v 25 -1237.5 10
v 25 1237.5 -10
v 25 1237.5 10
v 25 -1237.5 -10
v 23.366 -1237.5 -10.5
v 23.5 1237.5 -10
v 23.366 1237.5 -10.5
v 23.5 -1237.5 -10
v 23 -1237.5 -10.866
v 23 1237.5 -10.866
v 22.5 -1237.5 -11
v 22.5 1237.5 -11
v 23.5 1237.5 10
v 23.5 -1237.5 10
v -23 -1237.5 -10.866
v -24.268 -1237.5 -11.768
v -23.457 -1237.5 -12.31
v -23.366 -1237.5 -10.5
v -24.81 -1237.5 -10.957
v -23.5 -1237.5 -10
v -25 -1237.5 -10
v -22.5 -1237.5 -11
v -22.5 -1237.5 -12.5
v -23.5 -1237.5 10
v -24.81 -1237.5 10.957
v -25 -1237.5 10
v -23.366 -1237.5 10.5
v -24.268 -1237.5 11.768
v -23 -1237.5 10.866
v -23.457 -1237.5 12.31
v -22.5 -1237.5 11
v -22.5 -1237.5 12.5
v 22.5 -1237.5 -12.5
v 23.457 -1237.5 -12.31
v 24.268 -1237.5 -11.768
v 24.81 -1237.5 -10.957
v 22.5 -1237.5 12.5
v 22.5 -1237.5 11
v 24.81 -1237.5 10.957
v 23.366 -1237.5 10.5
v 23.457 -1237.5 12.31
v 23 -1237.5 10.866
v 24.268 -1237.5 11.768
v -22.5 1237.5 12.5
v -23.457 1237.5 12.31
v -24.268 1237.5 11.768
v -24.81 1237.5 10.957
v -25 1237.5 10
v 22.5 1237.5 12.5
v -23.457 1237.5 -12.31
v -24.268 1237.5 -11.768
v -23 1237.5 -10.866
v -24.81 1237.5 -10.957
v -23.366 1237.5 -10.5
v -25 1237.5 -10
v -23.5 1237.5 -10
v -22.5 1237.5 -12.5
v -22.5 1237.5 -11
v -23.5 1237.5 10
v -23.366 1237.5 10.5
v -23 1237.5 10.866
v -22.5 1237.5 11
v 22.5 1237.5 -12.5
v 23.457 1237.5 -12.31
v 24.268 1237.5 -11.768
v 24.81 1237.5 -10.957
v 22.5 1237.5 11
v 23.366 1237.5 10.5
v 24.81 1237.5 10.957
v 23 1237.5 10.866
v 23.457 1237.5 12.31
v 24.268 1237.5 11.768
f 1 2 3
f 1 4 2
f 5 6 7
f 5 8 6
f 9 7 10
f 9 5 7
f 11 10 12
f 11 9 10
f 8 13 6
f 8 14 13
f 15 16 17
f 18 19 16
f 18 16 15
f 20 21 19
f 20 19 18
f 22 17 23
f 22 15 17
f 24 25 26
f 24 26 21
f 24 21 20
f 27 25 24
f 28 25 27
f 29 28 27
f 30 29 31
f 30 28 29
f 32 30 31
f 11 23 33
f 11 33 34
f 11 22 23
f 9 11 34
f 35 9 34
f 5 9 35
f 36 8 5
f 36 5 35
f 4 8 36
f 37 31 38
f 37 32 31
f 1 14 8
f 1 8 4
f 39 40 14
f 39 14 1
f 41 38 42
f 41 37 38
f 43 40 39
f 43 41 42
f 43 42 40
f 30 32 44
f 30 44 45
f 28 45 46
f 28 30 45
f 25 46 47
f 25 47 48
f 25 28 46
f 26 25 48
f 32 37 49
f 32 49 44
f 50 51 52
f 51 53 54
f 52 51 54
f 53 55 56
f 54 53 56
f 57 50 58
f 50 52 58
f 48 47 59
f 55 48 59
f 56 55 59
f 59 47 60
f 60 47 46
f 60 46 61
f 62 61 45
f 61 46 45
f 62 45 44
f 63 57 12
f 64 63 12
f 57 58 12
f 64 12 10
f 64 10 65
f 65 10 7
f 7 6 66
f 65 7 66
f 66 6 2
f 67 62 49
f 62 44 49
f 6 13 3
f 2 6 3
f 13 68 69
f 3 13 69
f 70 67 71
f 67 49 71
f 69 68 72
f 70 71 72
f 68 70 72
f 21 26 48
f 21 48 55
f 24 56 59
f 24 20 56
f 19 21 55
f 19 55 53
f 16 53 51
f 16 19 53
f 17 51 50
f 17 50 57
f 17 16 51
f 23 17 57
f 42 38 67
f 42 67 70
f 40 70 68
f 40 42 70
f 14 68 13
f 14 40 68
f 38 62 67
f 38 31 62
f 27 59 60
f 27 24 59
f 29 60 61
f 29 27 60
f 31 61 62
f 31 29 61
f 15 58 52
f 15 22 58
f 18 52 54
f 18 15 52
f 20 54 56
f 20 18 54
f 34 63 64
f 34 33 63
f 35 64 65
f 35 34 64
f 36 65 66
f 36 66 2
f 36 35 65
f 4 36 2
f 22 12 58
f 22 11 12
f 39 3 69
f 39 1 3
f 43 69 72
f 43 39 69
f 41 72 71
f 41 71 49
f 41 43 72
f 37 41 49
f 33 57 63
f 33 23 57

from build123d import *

# Parameters (mm, degrees)
F1_DEPTH = 1237.5


with BuildPart() as f1:
    # F0 (on Front) → F1 (new body, symmetric)
    with BuildSketch(Plane.XZ):
        with BuildLine():
            ThreePointArc((25, 10), (24.267766953, 11.767766953), (22.5, 12.5))
            Line((22.5, 12.5), (-22.5, 12.5))
            ThreePointArc((-22.5, 12.5), (-24.267766953, 11.767766953), (-25, 10))
            Line((-25, 10), (-25, -10))
            ThreePointArc((-25, -10), (-24.267766953, -11.767766953), (-22.5, -12.5))
            Line((-22.5, -12.5), (22.5, -12.5))
            ThreePointArc((22.5, -12.5), (24.267766953, -11.767766953), (25, -10))
            Line((25, -10), (25, 10))
        make_face()
        with BuildLine():
            ThreePointArc((22.5, 11), (23.2071067812, 10.7071067812), (23.5, 10))
            Line((23.5, 10), (23.5, -10))
            ThreePointArc((23.5, -10), (23.2071067812, -10.7071067812), (22.5, -11))
            Line((22.5, -11), (-22.5, -11))
            ThreePointArc((-22.5, -11), (-23.2071067812, -10.7071067812), (-23.5, -10))
            Line((-23.5, -10), (-23.5, 10))
            ThreePointArc((-23.5, 10), (-23.2071067812, 10.7071067812), (-22.5, 11))
            Line((-22.5, 11), (22.5, 11))
        make_face(mode=Mode.SUBTRACT)
    extrude(amount=F1_DEPTH, both=True)


solid = f1.part
